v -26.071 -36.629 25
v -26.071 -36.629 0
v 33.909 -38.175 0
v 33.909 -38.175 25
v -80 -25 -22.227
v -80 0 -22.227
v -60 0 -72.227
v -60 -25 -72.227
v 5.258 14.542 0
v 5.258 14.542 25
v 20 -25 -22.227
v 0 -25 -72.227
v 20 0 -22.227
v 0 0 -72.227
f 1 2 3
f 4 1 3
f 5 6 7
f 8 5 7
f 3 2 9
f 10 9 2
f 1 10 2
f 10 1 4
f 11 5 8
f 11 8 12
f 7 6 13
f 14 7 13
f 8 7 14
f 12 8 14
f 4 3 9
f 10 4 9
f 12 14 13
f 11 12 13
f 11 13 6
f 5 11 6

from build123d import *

# Parameters (mm, degrees)
F2_DEPTH = 25
F3_DEPTH = 25


with BuildPart() as f2:
    # F0 (on Top) → F2 (new body)
    with BuildSketch(Plane.XY):
        Polygon((5.257778, 14.541994), (-26.071454, -36.629084), (33.908615, -38.175456), align=None)
    extrude(amount=F2_DEPTH)


with BuildPart() as f3:
    # F1 (on Front) → F3 (new body)
    with BuildSketch(Plane.XZ):
        Polygon((-80, -22.226929), (-60, -72.226929), (0, -72.226929), (20, -22.226929), align=None)
    extrude(amount=F3_DEPTH)


solid = Compound([f2.part, f3.part])
